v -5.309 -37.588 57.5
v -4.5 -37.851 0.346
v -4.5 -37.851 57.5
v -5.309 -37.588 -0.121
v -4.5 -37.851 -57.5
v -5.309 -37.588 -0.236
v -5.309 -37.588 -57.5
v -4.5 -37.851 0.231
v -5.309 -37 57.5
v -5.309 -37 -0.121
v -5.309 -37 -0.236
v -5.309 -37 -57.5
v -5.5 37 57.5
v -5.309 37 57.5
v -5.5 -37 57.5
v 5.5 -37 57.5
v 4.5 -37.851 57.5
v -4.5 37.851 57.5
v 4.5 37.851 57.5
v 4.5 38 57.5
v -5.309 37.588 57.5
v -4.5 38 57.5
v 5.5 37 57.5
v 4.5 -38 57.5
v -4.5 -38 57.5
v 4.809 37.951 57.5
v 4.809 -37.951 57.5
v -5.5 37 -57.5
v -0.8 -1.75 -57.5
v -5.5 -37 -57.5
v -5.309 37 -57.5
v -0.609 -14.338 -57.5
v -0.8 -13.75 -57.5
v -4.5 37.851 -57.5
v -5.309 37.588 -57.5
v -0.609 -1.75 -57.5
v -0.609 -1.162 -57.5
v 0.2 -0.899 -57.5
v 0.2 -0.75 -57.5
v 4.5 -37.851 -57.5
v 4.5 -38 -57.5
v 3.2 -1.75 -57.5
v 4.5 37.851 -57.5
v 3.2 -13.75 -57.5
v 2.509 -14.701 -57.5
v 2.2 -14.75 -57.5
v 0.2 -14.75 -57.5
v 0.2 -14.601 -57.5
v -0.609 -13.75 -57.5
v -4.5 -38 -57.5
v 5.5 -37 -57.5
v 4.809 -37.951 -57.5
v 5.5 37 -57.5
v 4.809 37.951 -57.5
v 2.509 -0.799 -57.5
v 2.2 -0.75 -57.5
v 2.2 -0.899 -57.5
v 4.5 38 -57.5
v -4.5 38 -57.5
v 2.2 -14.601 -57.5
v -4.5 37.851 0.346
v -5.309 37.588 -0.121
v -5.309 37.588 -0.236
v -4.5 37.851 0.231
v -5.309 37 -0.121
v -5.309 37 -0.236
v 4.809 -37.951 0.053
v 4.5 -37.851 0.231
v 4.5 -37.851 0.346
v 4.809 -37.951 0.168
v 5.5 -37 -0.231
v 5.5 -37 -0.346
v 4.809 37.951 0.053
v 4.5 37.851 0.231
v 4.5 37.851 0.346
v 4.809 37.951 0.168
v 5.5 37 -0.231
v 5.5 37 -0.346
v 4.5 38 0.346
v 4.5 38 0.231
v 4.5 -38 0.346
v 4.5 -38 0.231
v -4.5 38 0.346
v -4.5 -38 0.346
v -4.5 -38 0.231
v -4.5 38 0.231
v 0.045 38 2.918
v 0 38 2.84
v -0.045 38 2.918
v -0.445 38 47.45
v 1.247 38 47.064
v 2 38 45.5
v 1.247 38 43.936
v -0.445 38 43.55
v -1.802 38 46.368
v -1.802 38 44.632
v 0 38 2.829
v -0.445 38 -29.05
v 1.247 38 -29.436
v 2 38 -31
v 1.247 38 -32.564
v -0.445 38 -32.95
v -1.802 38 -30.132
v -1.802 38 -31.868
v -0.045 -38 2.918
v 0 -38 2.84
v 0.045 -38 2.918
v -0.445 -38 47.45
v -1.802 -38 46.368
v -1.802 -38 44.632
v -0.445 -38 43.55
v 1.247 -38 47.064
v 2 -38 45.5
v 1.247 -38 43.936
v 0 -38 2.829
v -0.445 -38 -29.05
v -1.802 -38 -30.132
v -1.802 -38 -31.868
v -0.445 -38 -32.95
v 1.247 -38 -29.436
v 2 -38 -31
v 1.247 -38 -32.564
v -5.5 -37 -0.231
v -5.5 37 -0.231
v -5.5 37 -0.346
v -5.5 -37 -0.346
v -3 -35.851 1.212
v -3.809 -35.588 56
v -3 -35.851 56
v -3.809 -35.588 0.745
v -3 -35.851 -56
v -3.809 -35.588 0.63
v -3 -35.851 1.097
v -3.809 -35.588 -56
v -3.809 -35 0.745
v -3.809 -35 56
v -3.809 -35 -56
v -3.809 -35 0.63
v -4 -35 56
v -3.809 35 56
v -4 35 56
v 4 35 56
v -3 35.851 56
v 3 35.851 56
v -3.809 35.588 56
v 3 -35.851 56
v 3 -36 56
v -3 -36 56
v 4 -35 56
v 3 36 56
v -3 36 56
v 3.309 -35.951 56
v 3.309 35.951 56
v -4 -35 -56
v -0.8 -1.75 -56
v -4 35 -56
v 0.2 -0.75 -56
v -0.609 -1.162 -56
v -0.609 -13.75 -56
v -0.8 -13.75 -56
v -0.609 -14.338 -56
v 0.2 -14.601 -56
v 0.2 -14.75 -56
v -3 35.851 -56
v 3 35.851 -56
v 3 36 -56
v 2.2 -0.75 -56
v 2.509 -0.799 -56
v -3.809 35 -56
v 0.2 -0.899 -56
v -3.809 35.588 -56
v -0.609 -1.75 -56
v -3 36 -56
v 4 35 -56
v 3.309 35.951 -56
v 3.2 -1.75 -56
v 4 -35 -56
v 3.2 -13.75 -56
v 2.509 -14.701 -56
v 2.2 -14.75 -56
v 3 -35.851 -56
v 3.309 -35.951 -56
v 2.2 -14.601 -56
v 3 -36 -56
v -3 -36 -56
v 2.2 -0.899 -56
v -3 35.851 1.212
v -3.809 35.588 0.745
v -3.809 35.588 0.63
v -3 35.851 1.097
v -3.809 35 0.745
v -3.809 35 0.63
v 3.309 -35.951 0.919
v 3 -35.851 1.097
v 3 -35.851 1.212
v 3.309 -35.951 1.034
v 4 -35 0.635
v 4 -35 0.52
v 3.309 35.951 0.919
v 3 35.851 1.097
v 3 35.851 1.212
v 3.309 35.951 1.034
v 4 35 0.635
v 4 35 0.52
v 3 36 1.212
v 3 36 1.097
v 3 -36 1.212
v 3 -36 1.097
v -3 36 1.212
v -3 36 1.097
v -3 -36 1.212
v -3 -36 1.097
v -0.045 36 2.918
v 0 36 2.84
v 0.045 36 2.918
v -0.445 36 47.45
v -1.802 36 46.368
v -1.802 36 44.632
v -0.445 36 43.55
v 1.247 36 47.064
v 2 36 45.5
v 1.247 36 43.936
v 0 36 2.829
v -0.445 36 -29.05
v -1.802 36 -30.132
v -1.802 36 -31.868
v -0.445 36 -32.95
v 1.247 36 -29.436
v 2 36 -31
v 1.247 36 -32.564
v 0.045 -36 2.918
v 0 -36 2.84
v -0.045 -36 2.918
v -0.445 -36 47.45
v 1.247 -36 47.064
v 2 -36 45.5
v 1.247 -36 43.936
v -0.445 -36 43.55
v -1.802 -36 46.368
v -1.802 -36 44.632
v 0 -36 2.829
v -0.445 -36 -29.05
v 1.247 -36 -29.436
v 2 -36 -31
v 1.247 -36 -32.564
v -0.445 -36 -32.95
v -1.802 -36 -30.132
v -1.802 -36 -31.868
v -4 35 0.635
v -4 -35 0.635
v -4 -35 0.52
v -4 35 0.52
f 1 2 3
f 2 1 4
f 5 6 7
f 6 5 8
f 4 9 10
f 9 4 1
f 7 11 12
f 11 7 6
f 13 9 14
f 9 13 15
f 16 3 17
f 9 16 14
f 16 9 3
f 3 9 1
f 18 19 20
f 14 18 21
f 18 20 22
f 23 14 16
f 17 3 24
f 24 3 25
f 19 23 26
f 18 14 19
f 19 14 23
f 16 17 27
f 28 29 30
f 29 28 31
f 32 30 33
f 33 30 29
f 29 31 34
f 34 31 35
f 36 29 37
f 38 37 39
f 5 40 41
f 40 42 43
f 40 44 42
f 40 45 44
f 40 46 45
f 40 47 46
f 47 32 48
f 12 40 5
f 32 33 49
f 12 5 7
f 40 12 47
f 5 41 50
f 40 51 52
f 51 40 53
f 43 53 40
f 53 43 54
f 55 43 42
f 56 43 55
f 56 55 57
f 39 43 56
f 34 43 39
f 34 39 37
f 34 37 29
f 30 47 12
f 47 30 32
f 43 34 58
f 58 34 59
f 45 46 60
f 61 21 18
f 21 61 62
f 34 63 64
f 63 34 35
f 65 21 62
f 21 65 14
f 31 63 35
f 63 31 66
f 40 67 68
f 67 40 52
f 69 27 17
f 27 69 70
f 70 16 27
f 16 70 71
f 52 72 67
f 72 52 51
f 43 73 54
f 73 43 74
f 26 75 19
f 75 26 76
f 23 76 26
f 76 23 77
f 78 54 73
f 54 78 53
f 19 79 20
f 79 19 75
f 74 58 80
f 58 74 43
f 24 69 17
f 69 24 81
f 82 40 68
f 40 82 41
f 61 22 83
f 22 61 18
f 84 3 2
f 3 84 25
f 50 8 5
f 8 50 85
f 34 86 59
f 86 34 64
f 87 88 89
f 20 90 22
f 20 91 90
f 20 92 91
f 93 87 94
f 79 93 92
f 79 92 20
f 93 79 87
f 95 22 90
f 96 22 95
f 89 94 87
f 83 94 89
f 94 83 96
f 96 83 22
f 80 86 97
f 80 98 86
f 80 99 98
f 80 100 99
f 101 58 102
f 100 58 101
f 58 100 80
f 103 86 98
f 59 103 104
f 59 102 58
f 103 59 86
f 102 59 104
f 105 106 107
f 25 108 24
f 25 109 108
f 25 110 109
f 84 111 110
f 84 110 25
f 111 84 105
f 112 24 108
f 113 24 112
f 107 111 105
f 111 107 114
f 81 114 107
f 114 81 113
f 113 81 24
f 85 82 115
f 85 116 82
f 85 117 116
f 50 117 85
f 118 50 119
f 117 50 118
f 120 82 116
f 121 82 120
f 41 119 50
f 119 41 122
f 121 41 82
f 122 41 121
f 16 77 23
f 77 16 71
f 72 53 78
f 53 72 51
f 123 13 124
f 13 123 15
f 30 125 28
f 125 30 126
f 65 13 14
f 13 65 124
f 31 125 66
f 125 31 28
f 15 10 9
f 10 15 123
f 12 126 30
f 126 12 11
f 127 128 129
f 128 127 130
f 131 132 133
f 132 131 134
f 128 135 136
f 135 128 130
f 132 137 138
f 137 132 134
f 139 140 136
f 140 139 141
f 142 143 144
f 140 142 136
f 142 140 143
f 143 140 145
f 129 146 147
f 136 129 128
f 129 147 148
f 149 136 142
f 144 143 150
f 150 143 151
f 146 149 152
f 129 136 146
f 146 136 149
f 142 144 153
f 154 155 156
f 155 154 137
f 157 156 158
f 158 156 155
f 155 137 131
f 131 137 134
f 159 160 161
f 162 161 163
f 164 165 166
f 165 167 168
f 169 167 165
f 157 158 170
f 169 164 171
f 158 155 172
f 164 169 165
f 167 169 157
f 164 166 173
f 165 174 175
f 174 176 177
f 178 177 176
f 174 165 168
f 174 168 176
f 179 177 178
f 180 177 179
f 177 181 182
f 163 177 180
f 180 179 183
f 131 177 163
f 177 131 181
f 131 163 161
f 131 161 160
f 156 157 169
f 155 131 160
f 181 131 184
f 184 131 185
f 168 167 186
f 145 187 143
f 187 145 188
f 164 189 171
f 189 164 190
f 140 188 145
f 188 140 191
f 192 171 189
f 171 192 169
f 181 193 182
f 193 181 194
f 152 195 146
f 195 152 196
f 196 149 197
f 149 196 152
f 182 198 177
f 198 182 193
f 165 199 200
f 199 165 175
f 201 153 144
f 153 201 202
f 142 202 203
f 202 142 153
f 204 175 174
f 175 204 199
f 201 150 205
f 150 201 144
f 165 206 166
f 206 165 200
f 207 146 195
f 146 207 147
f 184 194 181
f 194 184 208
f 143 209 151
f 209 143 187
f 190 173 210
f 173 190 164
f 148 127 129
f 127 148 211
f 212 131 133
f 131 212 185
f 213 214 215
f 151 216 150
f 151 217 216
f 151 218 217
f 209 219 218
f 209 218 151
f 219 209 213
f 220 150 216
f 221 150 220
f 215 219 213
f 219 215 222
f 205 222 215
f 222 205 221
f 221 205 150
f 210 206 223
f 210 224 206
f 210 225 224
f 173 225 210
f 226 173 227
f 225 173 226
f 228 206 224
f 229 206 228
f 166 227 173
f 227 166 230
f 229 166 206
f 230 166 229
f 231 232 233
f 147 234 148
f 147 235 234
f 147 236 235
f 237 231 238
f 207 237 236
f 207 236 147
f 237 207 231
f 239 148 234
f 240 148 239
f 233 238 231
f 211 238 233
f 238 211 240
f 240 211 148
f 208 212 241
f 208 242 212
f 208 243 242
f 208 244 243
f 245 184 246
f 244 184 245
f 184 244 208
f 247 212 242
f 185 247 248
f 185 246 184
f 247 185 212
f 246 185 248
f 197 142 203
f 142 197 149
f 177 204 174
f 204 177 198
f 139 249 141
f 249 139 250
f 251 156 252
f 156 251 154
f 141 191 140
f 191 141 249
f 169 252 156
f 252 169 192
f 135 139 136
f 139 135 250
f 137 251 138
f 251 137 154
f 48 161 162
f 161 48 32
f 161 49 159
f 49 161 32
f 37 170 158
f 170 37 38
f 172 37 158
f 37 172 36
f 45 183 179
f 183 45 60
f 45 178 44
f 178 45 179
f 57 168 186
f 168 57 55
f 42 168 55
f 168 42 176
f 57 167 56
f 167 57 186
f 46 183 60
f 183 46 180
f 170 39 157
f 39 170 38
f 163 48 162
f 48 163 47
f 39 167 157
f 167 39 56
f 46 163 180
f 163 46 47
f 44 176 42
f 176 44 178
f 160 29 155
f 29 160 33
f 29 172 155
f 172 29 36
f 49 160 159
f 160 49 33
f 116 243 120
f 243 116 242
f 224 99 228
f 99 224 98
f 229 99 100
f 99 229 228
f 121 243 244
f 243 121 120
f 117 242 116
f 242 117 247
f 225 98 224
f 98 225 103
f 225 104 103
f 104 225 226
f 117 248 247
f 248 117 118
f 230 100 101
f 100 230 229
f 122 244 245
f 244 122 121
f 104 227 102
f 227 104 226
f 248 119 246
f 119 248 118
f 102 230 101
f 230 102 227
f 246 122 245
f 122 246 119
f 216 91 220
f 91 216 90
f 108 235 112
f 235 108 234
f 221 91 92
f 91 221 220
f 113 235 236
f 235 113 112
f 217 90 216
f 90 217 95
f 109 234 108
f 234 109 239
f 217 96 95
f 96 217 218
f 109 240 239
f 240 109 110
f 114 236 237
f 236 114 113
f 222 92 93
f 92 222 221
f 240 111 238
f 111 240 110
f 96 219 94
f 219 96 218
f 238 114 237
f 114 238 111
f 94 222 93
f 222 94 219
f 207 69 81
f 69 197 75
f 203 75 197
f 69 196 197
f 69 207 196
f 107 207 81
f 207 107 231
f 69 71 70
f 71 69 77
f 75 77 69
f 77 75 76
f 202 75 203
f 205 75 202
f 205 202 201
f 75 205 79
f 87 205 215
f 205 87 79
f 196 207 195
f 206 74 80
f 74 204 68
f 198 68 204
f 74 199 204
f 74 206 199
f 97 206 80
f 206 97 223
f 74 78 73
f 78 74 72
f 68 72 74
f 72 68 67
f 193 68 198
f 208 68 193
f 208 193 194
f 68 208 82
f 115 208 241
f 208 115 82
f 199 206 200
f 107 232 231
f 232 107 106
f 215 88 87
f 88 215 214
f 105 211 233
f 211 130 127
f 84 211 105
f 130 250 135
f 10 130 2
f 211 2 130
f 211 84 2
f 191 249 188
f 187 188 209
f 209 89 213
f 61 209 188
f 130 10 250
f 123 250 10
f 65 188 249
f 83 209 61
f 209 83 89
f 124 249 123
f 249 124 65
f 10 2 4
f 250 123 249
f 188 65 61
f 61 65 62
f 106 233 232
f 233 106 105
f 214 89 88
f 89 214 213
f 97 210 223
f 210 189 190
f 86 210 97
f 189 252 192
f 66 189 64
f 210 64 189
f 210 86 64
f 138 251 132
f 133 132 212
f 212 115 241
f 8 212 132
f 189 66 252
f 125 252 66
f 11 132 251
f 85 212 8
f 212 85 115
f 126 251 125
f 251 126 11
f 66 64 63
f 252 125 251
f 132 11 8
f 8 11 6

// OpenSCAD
// An external SATA to USB 3 Disk enclosure
// Copyright (c) R. Linder
// This work is licensed under a Creative Commons Attribution 4.0 International License.

// Another example of how trivial it is to use OpenScad, and using slic3r
// or something similar to split the stl into two printable halves.
// NB !! This is for a 7mm disk, adjust if needed.

include <MCAD/shapes.scad>

module housing ()
{
    difference ()
    {
        roundedBox (11, 76, 115, 1);
        union ()
        {
            translate ([0,0,0]) roundedBox (8, 72, 112, 1);
            rotate ([90,0,0]) translate([0,-115/2+26.5,0])cylinder (r=2, h=78, center = true);
            rotate ([90,0,0]) translate([0,-115/2+26+77,0])cylinder (r=2, h=78, center = true);
            // usb3 7 up + 2
            translate ([1.2,-7.75,-115/2]) roundedBox (4,14,5,1);
            
            // Slice box in 2 parts
            translate([5,0,0]) rotate ([0,30,0]) cube ([11.5, 100, 0.1], center=true);
            translate([-5,0,0]) rotate ([0,-30,0]) cube ([11.5, 100, 0.1], center=true);
        }
    }
}


housing();
